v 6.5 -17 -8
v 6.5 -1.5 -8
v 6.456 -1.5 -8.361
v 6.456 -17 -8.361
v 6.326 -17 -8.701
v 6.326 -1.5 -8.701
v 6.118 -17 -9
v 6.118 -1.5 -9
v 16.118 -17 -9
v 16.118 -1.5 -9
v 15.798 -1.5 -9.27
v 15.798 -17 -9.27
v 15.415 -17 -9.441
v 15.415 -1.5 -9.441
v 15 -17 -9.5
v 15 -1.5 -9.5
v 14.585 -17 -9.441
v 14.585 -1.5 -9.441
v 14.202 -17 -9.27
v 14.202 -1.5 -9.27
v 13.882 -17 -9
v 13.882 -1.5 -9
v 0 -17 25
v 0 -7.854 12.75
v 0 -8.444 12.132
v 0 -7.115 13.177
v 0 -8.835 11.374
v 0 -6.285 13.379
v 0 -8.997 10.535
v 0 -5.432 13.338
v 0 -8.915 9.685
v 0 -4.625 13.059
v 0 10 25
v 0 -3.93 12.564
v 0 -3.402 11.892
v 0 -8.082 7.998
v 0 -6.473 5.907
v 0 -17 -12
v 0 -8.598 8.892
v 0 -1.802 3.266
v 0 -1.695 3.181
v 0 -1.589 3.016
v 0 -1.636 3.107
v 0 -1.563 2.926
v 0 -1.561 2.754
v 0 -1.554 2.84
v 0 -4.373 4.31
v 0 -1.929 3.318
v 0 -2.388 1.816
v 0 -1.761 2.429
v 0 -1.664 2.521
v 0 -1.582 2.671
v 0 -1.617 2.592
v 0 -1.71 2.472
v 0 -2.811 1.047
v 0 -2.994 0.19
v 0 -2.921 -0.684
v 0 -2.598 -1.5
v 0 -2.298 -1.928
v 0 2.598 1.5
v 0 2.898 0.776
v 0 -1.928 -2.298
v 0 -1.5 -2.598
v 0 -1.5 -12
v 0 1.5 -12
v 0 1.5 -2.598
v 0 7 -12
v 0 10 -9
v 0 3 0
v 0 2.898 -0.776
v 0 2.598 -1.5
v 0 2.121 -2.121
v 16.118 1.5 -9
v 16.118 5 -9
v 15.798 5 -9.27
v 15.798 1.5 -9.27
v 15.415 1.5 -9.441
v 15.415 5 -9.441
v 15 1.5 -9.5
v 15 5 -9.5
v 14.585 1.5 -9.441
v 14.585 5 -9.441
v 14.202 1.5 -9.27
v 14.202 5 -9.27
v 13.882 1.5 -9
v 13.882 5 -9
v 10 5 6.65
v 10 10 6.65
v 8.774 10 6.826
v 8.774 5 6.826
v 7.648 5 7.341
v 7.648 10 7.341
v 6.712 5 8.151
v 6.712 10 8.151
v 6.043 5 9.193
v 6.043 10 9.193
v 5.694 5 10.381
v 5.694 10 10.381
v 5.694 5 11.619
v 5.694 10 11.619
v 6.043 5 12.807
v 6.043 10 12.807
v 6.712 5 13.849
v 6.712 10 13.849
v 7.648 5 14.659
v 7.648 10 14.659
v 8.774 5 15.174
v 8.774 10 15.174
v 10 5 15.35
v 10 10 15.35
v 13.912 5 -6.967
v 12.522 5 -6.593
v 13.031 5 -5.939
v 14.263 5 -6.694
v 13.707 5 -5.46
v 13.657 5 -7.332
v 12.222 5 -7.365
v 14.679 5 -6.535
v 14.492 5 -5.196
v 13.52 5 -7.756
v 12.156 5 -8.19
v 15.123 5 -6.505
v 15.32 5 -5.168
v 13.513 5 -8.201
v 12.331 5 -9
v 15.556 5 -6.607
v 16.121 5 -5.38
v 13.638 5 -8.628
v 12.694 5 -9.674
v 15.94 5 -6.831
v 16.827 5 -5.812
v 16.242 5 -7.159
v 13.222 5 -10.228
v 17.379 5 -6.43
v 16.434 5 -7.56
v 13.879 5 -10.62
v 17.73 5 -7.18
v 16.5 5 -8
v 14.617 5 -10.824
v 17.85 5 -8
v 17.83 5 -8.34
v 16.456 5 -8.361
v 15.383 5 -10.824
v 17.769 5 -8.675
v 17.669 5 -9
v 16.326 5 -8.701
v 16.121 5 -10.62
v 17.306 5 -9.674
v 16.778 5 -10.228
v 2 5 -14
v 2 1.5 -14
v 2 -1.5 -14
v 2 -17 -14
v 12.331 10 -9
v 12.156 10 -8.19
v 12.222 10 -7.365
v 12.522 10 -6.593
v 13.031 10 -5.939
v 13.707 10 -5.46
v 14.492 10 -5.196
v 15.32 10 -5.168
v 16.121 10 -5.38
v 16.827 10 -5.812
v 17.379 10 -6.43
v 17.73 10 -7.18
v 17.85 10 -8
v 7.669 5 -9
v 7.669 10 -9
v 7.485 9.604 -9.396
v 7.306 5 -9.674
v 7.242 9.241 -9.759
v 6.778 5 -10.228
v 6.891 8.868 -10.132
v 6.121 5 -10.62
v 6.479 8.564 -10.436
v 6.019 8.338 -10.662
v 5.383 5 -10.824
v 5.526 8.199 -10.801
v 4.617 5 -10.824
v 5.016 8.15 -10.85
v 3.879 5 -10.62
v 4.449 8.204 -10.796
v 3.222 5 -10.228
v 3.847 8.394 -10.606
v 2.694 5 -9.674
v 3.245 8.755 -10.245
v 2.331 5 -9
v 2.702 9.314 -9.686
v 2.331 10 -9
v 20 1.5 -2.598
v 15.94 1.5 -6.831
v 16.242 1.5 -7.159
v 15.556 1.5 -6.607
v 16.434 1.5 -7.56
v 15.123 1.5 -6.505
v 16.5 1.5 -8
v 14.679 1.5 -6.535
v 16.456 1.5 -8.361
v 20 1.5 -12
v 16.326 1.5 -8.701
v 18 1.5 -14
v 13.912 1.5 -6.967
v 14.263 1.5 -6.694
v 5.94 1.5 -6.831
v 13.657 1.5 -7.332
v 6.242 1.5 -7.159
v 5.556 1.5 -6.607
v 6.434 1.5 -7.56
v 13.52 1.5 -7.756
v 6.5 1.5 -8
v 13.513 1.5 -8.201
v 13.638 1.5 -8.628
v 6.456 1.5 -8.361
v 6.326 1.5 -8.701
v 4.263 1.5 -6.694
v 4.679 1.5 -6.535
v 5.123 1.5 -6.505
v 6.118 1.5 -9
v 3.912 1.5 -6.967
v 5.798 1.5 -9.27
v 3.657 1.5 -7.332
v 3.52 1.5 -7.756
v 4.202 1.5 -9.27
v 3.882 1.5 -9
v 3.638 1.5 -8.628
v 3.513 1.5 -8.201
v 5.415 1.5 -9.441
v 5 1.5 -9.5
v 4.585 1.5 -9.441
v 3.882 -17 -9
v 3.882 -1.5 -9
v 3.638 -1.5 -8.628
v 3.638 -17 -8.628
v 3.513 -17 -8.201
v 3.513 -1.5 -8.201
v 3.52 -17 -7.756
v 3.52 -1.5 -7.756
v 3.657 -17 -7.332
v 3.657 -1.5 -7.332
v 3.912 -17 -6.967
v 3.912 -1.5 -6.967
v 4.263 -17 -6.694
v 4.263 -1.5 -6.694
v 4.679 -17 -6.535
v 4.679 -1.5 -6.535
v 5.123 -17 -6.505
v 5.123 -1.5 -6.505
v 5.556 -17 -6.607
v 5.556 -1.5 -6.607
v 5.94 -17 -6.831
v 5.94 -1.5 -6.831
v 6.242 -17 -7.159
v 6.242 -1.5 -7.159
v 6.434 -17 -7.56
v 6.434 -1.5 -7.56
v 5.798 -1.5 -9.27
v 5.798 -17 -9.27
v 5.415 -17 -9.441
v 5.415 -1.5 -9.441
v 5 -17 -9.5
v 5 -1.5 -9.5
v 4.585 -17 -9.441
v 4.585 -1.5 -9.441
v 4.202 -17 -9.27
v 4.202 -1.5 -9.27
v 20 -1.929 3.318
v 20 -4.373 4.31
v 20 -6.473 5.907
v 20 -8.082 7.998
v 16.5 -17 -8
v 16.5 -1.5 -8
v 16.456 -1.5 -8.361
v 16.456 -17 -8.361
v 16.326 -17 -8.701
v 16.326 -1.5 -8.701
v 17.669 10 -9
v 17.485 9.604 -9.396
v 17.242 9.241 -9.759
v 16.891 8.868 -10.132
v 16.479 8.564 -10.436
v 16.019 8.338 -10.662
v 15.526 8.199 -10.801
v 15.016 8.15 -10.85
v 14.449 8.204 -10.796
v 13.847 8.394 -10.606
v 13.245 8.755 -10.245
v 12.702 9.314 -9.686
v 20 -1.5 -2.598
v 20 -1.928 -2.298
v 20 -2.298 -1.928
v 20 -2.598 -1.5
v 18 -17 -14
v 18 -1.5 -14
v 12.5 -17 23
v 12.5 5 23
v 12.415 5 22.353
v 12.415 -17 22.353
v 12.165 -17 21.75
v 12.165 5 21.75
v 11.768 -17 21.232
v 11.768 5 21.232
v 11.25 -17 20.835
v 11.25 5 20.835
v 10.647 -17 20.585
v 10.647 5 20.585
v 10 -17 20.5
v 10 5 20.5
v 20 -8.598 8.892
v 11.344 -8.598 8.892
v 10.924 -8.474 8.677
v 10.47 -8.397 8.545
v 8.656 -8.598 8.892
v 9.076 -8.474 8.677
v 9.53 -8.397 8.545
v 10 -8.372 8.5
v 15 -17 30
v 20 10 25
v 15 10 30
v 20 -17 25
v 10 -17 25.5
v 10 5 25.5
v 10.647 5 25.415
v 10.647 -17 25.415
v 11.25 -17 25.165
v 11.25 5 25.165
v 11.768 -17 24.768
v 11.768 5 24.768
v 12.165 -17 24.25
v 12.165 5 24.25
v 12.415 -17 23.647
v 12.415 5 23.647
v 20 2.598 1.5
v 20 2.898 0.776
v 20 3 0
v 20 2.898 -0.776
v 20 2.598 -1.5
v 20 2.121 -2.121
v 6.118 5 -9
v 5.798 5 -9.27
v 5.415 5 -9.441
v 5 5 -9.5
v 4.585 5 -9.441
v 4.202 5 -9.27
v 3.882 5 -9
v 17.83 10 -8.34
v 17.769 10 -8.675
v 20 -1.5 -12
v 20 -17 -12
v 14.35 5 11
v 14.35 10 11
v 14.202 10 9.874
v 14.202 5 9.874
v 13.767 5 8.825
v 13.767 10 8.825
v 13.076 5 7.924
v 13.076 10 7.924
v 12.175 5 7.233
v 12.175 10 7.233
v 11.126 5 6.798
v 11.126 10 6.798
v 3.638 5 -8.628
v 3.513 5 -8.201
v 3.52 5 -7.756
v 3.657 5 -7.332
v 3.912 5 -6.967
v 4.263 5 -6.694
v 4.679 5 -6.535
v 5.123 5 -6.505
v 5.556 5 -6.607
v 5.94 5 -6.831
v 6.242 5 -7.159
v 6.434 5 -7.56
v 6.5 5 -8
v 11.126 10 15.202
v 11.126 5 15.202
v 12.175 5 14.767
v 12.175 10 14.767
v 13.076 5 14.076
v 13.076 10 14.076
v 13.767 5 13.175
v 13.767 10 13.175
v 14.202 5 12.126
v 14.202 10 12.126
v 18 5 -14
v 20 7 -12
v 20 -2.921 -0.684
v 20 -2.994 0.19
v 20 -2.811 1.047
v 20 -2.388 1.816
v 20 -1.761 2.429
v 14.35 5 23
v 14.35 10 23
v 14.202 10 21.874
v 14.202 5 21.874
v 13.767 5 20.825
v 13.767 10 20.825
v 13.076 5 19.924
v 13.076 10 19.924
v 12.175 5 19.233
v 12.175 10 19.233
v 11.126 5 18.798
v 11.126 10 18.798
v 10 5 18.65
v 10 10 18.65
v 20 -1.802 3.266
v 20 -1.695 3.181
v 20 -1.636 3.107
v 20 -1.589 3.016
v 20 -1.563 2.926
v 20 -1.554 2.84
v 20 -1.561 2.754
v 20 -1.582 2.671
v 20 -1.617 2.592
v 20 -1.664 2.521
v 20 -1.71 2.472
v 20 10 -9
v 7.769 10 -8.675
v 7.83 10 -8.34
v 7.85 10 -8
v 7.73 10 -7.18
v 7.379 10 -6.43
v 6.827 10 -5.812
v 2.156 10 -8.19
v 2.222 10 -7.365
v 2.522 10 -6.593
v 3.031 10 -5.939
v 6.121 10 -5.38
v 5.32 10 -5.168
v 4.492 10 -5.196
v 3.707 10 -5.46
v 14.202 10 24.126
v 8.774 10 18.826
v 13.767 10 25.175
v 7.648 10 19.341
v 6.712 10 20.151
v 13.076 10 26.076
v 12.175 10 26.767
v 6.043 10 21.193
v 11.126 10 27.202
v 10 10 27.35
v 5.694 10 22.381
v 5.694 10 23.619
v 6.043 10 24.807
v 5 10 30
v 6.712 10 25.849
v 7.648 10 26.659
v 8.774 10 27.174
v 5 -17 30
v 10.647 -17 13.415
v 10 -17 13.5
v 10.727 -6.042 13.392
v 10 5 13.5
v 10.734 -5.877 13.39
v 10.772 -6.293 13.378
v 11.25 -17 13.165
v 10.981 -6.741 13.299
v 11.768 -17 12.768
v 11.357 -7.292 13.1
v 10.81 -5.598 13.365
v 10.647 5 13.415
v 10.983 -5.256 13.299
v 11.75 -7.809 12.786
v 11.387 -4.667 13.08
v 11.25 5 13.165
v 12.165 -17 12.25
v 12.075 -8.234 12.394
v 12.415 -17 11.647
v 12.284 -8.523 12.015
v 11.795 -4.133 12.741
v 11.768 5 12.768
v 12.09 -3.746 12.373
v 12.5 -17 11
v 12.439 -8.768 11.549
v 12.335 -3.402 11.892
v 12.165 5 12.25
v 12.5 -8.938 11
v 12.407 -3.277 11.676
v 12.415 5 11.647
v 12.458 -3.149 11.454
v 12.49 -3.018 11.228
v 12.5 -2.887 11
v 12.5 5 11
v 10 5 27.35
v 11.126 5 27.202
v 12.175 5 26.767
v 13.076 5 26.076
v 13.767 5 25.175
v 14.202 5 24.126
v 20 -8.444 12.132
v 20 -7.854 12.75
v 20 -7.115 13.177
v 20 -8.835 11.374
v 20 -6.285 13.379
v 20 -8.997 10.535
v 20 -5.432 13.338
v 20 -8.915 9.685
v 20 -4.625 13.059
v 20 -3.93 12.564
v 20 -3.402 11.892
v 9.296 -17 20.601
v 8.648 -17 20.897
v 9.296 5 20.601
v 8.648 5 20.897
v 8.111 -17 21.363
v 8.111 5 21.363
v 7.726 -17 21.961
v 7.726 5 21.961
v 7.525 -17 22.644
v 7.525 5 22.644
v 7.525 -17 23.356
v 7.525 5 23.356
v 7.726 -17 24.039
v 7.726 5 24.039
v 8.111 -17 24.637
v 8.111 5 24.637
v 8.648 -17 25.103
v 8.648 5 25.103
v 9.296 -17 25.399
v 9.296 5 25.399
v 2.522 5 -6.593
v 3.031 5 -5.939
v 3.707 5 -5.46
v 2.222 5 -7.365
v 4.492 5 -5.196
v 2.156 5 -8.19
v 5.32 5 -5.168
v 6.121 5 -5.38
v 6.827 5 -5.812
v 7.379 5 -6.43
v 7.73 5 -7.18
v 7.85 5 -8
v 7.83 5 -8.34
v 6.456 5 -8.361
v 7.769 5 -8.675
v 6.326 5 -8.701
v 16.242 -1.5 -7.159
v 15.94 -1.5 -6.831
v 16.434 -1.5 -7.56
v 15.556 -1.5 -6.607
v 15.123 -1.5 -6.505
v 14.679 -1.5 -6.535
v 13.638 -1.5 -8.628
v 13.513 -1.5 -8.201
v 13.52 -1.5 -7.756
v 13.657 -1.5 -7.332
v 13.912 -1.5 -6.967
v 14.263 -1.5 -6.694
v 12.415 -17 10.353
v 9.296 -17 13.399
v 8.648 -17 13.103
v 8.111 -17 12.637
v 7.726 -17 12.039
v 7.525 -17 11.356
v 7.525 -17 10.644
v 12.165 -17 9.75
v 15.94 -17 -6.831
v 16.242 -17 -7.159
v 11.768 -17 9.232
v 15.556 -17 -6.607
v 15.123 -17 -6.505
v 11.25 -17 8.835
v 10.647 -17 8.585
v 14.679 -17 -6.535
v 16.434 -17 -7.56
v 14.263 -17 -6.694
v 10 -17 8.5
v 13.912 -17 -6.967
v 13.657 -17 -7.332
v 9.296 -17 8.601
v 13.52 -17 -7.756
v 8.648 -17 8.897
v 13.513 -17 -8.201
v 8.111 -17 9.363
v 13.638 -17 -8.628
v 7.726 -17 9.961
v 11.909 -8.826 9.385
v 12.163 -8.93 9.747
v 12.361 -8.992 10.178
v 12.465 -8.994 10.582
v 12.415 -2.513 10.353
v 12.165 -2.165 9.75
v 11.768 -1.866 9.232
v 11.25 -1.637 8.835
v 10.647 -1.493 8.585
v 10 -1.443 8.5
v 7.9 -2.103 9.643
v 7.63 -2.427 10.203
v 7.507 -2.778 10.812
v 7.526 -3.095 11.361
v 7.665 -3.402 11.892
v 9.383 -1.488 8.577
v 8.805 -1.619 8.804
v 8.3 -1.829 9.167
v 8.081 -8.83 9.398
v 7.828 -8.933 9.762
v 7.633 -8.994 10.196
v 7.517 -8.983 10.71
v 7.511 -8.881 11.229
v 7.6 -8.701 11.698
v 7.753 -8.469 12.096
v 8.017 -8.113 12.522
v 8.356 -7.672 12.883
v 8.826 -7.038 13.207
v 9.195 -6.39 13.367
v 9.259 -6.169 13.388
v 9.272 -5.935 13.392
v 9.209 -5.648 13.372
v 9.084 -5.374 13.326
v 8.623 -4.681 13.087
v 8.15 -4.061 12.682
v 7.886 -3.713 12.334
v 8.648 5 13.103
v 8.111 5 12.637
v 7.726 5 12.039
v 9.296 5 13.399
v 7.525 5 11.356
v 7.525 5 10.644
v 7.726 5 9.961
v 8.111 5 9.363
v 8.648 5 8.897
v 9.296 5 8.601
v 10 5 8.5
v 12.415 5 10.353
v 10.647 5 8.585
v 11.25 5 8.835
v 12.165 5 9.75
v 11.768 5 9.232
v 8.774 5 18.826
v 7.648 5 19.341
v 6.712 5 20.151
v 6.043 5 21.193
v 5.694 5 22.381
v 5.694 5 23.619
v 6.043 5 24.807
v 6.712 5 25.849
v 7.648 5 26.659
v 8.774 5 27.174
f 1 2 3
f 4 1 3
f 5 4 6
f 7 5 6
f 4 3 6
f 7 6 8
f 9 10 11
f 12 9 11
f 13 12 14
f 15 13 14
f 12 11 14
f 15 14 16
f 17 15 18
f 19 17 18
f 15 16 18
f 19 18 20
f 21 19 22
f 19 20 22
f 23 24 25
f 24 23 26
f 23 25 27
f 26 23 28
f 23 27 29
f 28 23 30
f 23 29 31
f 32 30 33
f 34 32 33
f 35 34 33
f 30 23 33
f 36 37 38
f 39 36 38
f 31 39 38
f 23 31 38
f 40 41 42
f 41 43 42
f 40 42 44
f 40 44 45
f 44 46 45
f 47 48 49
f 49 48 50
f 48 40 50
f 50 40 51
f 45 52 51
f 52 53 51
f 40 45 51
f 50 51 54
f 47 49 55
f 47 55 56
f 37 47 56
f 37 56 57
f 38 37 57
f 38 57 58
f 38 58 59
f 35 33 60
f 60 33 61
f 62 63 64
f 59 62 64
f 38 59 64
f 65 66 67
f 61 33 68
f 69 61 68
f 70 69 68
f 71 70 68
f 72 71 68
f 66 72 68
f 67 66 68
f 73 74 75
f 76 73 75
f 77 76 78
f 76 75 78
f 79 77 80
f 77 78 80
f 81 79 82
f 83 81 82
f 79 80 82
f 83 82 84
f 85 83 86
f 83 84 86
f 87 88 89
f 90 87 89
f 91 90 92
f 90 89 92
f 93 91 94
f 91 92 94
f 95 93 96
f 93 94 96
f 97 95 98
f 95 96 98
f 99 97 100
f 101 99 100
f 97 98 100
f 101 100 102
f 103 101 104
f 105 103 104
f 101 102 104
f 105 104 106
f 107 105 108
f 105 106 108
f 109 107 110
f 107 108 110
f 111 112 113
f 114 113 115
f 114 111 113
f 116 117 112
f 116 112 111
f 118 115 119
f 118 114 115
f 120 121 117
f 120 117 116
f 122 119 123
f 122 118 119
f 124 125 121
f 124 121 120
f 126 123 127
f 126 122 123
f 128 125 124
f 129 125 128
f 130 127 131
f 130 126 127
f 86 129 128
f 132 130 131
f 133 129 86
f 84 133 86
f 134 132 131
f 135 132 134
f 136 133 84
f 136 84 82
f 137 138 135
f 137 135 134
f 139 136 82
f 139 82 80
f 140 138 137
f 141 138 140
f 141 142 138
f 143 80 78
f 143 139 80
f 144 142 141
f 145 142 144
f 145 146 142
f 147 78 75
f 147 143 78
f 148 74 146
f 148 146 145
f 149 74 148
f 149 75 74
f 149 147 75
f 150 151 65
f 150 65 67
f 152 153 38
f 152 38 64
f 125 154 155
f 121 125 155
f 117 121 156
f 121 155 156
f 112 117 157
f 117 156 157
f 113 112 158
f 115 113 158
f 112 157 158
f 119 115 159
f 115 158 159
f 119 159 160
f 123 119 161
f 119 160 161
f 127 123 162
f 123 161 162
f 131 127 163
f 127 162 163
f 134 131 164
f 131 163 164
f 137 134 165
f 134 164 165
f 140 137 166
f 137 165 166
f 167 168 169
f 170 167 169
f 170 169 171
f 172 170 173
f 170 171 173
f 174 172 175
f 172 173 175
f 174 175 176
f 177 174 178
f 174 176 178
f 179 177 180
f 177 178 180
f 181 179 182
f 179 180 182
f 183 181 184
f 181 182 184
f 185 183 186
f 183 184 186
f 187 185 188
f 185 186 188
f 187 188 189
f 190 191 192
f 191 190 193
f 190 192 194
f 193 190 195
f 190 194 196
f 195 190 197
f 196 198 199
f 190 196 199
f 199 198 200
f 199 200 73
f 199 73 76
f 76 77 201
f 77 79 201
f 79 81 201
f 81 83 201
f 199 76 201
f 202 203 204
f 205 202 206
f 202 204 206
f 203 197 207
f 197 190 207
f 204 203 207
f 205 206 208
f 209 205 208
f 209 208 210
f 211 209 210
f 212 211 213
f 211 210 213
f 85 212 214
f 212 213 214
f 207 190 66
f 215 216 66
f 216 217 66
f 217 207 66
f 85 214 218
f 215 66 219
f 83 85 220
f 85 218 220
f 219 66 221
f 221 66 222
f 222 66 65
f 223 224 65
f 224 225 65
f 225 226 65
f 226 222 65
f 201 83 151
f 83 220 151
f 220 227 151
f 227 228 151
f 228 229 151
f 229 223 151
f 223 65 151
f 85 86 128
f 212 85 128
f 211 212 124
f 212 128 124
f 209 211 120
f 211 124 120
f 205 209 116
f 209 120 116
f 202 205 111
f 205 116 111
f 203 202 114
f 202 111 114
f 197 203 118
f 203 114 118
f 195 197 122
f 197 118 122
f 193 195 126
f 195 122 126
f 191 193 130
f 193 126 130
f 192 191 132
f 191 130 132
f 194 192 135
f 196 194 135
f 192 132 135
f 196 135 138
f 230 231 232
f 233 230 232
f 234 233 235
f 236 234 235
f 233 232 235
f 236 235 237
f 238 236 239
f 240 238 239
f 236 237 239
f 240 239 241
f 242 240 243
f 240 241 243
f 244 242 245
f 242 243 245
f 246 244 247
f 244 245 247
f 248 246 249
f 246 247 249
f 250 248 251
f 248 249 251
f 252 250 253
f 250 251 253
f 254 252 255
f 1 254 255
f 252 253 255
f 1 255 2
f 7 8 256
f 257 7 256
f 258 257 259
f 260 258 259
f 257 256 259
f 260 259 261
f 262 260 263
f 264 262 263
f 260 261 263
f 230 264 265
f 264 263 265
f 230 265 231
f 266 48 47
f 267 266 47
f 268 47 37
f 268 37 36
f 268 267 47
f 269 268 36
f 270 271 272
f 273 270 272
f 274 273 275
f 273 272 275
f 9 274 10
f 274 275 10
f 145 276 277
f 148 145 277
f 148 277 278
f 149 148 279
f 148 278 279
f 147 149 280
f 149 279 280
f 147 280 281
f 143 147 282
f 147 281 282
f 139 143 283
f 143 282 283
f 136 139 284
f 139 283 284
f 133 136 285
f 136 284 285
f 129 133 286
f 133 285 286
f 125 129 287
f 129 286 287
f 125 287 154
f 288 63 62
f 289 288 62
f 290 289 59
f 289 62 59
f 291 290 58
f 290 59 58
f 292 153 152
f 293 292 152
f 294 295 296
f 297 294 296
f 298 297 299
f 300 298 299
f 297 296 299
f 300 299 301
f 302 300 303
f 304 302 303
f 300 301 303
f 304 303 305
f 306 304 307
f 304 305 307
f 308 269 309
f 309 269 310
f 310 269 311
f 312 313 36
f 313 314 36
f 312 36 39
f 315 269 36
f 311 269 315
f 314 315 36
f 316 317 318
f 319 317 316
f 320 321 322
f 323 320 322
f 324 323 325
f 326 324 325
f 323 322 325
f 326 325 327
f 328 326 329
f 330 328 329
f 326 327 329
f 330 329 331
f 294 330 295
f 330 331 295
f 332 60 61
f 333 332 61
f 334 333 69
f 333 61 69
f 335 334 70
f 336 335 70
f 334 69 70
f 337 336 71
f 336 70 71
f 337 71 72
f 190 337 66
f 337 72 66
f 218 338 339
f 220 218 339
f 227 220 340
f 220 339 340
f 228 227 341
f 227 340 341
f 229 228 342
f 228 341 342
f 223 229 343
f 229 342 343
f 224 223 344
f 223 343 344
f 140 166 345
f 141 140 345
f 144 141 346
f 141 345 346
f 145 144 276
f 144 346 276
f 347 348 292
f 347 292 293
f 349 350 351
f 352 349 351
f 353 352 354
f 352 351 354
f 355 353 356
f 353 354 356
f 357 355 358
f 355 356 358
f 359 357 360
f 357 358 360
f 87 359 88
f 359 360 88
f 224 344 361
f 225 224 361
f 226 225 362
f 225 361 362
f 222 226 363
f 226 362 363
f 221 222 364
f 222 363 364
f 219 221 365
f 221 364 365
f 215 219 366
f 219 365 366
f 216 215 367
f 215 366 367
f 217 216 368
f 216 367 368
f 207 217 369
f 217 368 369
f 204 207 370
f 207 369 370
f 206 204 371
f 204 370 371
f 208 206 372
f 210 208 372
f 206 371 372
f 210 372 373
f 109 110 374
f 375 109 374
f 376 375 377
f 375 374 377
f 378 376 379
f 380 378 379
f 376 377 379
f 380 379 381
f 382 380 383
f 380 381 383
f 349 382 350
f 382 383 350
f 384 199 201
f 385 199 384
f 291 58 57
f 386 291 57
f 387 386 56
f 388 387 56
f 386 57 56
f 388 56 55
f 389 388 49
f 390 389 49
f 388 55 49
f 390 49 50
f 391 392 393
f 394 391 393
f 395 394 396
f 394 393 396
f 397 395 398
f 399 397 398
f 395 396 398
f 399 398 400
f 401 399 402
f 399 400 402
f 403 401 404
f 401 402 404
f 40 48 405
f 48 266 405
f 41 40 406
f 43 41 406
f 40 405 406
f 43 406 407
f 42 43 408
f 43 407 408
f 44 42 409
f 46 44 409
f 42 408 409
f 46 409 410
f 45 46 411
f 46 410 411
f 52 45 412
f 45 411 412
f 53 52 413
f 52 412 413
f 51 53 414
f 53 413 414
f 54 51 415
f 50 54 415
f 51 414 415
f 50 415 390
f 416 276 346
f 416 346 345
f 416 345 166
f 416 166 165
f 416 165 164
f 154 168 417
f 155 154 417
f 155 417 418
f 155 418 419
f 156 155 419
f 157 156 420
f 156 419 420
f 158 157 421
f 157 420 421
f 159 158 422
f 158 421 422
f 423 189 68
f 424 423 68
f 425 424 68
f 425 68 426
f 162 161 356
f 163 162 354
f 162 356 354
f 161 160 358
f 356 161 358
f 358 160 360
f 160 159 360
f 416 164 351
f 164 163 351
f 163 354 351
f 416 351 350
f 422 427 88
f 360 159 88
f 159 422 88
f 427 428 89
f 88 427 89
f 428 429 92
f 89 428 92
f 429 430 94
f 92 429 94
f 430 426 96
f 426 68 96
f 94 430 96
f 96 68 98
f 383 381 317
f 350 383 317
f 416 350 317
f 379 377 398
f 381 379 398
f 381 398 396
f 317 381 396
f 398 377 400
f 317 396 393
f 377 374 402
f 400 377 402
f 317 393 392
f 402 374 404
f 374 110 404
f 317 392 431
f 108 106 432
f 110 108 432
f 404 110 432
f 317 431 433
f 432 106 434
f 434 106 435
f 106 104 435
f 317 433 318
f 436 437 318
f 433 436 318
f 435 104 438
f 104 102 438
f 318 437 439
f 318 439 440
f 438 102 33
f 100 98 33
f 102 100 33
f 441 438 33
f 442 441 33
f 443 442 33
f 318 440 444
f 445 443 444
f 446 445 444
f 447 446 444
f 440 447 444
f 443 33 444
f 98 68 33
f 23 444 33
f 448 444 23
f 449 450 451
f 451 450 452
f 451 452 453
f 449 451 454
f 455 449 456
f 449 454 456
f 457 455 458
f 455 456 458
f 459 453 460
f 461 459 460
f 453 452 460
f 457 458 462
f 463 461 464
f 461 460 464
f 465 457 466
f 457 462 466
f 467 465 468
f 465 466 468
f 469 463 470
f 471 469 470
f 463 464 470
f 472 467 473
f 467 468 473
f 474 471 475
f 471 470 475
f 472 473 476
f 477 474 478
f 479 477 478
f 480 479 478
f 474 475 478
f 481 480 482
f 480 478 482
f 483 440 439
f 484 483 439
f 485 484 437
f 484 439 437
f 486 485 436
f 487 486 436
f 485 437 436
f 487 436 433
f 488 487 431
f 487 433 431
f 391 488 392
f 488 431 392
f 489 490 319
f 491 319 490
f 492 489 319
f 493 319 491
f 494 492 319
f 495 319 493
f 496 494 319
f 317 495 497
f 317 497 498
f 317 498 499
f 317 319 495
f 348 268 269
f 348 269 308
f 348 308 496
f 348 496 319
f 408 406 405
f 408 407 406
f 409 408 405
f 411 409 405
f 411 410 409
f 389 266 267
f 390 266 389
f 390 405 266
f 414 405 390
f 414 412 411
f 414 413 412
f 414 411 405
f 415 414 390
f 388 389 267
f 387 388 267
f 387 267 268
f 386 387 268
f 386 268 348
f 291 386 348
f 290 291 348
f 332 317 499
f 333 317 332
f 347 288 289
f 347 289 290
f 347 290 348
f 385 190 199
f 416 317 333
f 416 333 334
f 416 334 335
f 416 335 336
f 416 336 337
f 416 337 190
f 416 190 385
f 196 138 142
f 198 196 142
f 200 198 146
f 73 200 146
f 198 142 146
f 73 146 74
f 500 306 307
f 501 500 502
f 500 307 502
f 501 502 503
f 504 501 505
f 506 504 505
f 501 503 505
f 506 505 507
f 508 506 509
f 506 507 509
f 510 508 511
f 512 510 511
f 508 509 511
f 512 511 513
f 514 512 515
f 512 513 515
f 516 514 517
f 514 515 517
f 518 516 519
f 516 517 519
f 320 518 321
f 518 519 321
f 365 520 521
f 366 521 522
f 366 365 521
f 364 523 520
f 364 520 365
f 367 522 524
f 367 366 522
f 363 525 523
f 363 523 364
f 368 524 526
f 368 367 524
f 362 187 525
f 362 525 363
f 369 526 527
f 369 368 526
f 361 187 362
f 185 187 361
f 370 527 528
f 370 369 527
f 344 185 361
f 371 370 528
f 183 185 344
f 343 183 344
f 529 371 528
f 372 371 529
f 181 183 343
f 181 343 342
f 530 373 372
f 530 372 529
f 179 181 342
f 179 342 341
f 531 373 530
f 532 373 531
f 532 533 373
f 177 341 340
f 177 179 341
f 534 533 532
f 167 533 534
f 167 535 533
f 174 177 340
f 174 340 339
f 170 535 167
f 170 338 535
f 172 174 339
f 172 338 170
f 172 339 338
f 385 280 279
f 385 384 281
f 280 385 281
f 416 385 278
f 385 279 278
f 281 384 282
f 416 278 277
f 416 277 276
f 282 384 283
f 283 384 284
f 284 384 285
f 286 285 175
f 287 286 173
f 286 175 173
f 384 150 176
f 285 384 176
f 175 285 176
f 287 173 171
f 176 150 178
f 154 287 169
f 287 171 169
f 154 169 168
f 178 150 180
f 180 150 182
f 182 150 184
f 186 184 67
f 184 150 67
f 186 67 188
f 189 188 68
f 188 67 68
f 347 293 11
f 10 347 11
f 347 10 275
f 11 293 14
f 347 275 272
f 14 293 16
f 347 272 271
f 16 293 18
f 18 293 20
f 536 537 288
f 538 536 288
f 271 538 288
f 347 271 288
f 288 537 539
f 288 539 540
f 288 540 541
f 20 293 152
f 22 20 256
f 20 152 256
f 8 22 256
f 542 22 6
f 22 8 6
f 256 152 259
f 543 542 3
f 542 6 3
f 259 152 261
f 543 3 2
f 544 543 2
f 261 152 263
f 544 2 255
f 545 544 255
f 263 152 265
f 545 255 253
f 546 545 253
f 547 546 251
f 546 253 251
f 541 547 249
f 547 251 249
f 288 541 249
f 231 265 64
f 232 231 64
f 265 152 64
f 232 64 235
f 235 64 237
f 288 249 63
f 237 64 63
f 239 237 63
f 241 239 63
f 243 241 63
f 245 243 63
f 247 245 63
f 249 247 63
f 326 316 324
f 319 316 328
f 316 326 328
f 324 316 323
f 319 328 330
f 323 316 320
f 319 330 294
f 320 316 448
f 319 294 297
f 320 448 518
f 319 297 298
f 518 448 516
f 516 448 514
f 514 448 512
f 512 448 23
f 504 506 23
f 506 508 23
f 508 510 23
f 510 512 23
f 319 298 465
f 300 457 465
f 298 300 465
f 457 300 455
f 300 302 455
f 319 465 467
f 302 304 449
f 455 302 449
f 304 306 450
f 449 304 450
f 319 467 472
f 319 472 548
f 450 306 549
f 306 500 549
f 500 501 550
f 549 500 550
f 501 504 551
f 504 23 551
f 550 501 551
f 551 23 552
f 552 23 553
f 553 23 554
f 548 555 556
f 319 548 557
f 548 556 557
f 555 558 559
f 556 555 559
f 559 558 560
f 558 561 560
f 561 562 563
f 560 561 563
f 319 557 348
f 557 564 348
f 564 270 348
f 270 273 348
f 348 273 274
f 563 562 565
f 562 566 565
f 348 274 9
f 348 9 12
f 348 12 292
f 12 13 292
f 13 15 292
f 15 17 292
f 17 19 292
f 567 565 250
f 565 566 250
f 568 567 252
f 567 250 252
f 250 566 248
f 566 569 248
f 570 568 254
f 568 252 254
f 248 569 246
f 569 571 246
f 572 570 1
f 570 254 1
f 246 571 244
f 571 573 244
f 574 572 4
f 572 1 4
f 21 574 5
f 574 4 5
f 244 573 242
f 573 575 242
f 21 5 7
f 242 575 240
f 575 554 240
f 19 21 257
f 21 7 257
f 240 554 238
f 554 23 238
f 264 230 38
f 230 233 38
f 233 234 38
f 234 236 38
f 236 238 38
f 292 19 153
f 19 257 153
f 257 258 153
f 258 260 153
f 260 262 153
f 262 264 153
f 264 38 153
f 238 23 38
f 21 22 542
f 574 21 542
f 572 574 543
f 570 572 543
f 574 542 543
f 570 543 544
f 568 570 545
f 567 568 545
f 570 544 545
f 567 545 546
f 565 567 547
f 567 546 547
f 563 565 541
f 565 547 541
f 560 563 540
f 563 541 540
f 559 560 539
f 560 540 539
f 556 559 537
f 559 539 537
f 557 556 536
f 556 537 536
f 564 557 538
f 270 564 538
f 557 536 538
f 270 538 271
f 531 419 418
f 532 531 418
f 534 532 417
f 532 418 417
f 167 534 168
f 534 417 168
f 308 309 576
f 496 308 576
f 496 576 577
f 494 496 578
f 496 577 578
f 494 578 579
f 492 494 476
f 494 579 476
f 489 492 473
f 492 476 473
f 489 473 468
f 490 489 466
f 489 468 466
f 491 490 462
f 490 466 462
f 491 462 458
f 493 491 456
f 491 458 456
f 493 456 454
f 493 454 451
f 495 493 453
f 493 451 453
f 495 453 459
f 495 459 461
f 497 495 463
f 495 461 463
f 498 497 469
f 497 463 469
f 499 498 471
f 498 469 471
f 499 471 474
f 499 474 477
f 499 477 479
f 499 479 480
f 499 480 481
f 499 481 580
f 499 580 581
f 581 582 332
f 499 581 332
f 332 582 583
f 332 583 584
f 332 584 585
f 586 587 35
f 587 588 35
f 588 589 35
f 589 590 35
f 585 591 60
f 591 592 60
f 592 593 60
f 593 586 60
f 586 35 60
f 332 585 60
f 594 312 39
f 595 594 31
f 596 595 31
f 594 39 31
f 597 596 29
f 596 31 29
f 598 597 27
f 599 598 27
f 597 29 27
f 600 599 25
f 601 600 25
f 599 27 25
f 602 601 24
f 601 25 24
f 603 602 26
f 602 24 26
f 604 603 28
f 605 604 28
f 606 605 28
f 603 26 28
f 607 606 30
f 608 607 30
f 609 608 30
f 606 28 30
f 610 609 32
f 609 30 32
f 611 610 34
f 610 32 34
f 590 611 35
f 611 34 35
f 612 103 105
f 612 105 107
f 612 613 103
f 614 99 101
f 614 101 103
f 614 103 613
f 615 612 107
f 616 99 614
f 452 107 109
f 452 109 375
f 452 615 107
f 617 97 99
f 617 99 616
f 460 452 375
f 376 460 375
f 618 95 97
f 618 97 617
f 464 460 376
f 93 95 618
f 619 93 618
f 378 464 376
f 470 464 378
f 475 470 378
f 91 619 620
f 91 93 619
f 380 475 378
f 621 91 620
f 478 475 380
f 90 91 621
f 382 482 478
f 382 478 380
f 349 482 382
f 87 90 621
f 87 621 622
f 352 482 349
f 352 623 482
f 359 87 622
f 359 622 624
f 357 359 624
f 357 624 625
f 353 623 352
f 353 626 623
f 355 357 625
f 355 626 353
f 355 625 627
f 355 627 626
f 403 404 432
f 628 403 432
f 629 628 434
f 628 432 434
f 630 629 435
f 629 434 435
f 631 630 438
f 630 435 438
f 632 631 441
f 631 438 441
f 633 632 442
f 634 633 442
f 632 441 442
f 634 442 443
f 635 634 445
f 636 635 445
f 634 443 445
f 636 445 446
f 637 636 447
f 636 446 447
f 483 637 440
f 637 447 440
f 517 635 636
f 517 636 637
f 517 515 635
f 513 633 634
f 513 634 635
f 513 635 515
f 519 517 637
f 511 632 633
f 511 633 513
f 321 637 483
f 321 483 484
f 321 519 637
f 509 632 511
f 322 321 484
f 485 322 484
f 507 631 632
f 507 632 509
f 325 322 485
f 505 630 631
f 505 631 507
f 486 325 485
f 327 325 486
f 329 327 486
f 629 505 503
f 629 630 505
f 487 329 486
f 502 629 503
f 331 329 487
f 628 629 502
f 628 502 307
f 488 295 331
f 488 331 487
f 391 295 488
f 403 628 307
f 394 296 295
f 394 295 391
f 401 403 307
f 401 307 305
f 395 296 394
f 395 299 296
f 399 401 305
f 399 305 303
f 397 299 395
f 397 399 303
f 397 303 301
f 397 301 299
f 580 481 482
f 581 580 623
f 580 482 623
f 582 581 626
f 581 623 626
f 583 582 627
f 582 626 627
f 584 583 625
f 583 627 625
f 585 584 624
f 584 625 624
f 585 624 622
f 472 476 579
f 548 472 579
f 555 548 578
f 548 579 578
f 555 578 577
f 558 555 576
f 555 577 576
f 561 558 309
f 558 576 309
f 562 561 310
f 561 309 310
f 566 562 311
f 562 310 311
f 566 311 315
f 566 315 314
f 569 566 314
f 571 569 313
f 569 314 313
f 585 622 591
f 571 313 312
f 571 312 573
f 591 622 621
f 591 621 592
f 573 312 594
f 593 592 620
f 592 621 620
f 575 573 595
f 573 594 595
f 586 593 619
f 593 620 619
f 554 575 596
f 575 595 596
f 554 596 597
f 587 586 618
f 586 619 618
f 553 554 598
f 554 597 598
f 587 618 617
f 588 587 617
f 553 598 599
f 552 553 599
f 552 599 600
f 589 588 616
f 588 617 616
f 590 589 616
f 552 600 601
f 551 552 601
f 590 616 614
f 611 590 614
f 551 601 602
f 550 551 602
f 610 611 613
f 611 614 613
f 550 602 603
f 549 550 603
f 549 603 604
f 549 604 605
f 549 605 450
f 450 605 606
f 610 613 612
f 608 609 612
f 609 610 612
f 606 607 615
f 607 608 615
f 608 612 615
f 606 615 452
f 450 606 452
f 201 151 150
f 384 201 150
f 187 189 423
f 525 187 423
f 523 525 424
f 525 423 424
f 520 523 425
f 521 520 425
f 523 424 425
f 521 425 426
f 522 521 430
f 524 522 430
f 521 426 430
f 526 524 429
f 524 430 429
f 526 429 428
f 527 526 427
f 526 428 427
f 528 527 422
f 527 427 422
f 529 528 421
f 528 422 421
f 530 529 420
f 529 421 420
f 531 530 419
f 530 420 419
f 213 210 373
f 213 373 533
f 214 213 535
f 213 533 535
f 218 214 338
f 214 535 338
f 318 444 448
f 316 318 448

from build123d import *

# Parameters (mm, degrees)
EXTRUDE_1_DEPTH     = 20
FILLET_1_R          = 10
FILLET_2_R          = 0.5
SKETCH_2_R          = 4.35
SKETCH_2_R_2        = 2.5
CUT_EXTRUDE_1_DEPTH = 5
SKETCH_2_3_R        = 2.85
SKETCH_2_3_R_2      = 1.5
CUT_EXTRUDE_2_DEPTH = 5
SKETCH_2_4_R        = 2.5
SKETCH_2_4_R_2      = 1.5
CUT_EXTRUDE_3_DEPTH = 46.044422689
CHAMFER_1_SIZE      = 5
CHAMFER_2_SIZE      = 2


with BuildPart() as part:
    # 스케치1 → 보스-돌출1 (new body)
    with BuildSketch(Plane(origin=(0, 0, 0), x_dir=(0, 0, -1), z_dir=(1, 0, 0))):
        with BuildLine():
            ThreePointArc((-8.892304845, -8.598076211), (-12.990381057, -7.5), (-11.892304845, -3.401923789))
            Line((-11.892304845, -3.401923789), (-1.5, 2.598076211))
            ThreePointArc((-1.5, 2.598076211), (0.776457135, 2.897777479), (2.598076211, 1.5))
            Line((2.598076211, 1.5), (14, 1.5))
            Line((14, 1.5), (14, 5))
            Line((14, 5), (9, 10))
            Line((9, 10), (-30, 10))
            Line((-30, 10), (-30, -17))
            Line((-30, -17), (14, -17))
            Line((14, -17), (14, -1.5))
            Line((14, -1.5), (2.598076211, -1.5))
            ThreePointArc((2.598076211, -1.5), (-0.776457135, -2.897777479), (-3, 0))
            Line((-3, 0), (-3.62758528, -5.558488953))
            Line((-3.62758528, -5.558488953), (-8.892304845, -8.598076211))
        make_face()
    extrude(amount=EXTRUDE_1_DEPTH)

    # 필렛1
    fillet_1_edges = [part.edges().sort_by_distance(p)[0] for p in [
        (10, -5.558488953, 3.62758528),
    ]]
    fillet(fillet_1_edges, radius=FILLET_1_R)

    # 필렛2
    fillet_2_edges = [part.edges().sort_by_distance(p)[0] for p in [
        (10, 0, 3),
    ]]
    fillet(fillet_2_edges, radius=FILLET_2_R)

    # 스케치2 → 컷-돌출1 (cut)
    # profile 1 of 2: a face of its own
    with BuildSketch(Plane(origin=(0, 10, 0), x_dir=(1, 0, 0), z_dir=(0, 1, 0))):
        with Locations((10, -11)):
            Circle(SKETCH_2_R)
        with Locations((10, -11)):
            Circle(SKETCH_2_R_2, mode=Mode.SUBTRACT)
    # profile 2 of 2: a face of its own
    with BuildSketch(Plane(origin=(0, 10, 0), x_dir=(1, 0, 0), z_dir=(0, 1, 0))):
        with Locations((10, -23)):
            Circle(SKETCH_2_R)
        with Locations((10, -23)):
            Circle(SKETCH_2_R_2, mode=Mode.SUBTRACT)
    extrude(amount=-CUT_EXTRUDE_1_DEPTH, mode=Mode.SUBTRACT)

    # 스케치2<3> → 컷-돌출2 (cut)
    # profile 1 of 2: a face of its own
    with BuildSketch(Plane(origin=(0, 10, 0), x_dir=(1, 0, 0), z_dir=(0, 1, 0))):
        with Locations((5, 8)):
            Circle(SKETCH_2_3_R)
        with Locations((5, 8)):
            Circle(SKETCH_2_3_R_2, mode=Mode.SUBTRACT)
    # profile 2 of 2: a face of its own
    with BuildSketch(Plane(origin=(0, 10, 0), x_dir=(1, 0, 0), z_dir=(0, 1, 0))):
        with Locations((15, 8)):
            Circle(SKETCH_2_3_R)
        with Locations((15, 8)):
            Circle(SKETCH_2_3_R_2, mode=Mode.SUBTRACT)
    extrude(amount=-CUT_EXTRUDE_2_DEPTH, mode=Mode.SUBTRACT)

    # 스케치2<4> → 컷-돌출3 (cut, through all)
    with BuildSketch(Plane(origin=(0, 10, 0), x_dir=(1, 0, 0), z_dir=(0, 1, 0))):
        with Locations((10, -11)):
            Circle(SKETCH_2_4_R)
        with Locations((15, 8)):
            Circle(SKETCH_2_4_R_2)
        with Locations((5, 8)):
            Circle(SKETCH_2_4_R_2)
        with Locations((10, -23)):
            Circle(SKETCH_2_4_R)
    extrude(amount=-CUT_EXTRUDE_3_DEPTH, mode=Mode.SUBTRACT)

    # 모따기1
    chamfer_1_edges = [part.edges().sort_by_distance(p)[0] for p in [
        (20, -3.5, 30),
        (0, -3.5, 30),
    ]]
    chamfer(chamfer_1_edges, length=CHAMFER_1_SIZE)

    # 모따기2
    chamfer_2_edges = [part.edges().sort_by_distance(p)[0] for p in [
        (0, -9.25, -14),
        (0, 3.25, -14),
        (20, 3.25, -14),
        (20, -9.25, -14),
    ]]
    chamfer(chamfer_2_edges, length=CHAMFER_2_SIZE)


solid = part.part
